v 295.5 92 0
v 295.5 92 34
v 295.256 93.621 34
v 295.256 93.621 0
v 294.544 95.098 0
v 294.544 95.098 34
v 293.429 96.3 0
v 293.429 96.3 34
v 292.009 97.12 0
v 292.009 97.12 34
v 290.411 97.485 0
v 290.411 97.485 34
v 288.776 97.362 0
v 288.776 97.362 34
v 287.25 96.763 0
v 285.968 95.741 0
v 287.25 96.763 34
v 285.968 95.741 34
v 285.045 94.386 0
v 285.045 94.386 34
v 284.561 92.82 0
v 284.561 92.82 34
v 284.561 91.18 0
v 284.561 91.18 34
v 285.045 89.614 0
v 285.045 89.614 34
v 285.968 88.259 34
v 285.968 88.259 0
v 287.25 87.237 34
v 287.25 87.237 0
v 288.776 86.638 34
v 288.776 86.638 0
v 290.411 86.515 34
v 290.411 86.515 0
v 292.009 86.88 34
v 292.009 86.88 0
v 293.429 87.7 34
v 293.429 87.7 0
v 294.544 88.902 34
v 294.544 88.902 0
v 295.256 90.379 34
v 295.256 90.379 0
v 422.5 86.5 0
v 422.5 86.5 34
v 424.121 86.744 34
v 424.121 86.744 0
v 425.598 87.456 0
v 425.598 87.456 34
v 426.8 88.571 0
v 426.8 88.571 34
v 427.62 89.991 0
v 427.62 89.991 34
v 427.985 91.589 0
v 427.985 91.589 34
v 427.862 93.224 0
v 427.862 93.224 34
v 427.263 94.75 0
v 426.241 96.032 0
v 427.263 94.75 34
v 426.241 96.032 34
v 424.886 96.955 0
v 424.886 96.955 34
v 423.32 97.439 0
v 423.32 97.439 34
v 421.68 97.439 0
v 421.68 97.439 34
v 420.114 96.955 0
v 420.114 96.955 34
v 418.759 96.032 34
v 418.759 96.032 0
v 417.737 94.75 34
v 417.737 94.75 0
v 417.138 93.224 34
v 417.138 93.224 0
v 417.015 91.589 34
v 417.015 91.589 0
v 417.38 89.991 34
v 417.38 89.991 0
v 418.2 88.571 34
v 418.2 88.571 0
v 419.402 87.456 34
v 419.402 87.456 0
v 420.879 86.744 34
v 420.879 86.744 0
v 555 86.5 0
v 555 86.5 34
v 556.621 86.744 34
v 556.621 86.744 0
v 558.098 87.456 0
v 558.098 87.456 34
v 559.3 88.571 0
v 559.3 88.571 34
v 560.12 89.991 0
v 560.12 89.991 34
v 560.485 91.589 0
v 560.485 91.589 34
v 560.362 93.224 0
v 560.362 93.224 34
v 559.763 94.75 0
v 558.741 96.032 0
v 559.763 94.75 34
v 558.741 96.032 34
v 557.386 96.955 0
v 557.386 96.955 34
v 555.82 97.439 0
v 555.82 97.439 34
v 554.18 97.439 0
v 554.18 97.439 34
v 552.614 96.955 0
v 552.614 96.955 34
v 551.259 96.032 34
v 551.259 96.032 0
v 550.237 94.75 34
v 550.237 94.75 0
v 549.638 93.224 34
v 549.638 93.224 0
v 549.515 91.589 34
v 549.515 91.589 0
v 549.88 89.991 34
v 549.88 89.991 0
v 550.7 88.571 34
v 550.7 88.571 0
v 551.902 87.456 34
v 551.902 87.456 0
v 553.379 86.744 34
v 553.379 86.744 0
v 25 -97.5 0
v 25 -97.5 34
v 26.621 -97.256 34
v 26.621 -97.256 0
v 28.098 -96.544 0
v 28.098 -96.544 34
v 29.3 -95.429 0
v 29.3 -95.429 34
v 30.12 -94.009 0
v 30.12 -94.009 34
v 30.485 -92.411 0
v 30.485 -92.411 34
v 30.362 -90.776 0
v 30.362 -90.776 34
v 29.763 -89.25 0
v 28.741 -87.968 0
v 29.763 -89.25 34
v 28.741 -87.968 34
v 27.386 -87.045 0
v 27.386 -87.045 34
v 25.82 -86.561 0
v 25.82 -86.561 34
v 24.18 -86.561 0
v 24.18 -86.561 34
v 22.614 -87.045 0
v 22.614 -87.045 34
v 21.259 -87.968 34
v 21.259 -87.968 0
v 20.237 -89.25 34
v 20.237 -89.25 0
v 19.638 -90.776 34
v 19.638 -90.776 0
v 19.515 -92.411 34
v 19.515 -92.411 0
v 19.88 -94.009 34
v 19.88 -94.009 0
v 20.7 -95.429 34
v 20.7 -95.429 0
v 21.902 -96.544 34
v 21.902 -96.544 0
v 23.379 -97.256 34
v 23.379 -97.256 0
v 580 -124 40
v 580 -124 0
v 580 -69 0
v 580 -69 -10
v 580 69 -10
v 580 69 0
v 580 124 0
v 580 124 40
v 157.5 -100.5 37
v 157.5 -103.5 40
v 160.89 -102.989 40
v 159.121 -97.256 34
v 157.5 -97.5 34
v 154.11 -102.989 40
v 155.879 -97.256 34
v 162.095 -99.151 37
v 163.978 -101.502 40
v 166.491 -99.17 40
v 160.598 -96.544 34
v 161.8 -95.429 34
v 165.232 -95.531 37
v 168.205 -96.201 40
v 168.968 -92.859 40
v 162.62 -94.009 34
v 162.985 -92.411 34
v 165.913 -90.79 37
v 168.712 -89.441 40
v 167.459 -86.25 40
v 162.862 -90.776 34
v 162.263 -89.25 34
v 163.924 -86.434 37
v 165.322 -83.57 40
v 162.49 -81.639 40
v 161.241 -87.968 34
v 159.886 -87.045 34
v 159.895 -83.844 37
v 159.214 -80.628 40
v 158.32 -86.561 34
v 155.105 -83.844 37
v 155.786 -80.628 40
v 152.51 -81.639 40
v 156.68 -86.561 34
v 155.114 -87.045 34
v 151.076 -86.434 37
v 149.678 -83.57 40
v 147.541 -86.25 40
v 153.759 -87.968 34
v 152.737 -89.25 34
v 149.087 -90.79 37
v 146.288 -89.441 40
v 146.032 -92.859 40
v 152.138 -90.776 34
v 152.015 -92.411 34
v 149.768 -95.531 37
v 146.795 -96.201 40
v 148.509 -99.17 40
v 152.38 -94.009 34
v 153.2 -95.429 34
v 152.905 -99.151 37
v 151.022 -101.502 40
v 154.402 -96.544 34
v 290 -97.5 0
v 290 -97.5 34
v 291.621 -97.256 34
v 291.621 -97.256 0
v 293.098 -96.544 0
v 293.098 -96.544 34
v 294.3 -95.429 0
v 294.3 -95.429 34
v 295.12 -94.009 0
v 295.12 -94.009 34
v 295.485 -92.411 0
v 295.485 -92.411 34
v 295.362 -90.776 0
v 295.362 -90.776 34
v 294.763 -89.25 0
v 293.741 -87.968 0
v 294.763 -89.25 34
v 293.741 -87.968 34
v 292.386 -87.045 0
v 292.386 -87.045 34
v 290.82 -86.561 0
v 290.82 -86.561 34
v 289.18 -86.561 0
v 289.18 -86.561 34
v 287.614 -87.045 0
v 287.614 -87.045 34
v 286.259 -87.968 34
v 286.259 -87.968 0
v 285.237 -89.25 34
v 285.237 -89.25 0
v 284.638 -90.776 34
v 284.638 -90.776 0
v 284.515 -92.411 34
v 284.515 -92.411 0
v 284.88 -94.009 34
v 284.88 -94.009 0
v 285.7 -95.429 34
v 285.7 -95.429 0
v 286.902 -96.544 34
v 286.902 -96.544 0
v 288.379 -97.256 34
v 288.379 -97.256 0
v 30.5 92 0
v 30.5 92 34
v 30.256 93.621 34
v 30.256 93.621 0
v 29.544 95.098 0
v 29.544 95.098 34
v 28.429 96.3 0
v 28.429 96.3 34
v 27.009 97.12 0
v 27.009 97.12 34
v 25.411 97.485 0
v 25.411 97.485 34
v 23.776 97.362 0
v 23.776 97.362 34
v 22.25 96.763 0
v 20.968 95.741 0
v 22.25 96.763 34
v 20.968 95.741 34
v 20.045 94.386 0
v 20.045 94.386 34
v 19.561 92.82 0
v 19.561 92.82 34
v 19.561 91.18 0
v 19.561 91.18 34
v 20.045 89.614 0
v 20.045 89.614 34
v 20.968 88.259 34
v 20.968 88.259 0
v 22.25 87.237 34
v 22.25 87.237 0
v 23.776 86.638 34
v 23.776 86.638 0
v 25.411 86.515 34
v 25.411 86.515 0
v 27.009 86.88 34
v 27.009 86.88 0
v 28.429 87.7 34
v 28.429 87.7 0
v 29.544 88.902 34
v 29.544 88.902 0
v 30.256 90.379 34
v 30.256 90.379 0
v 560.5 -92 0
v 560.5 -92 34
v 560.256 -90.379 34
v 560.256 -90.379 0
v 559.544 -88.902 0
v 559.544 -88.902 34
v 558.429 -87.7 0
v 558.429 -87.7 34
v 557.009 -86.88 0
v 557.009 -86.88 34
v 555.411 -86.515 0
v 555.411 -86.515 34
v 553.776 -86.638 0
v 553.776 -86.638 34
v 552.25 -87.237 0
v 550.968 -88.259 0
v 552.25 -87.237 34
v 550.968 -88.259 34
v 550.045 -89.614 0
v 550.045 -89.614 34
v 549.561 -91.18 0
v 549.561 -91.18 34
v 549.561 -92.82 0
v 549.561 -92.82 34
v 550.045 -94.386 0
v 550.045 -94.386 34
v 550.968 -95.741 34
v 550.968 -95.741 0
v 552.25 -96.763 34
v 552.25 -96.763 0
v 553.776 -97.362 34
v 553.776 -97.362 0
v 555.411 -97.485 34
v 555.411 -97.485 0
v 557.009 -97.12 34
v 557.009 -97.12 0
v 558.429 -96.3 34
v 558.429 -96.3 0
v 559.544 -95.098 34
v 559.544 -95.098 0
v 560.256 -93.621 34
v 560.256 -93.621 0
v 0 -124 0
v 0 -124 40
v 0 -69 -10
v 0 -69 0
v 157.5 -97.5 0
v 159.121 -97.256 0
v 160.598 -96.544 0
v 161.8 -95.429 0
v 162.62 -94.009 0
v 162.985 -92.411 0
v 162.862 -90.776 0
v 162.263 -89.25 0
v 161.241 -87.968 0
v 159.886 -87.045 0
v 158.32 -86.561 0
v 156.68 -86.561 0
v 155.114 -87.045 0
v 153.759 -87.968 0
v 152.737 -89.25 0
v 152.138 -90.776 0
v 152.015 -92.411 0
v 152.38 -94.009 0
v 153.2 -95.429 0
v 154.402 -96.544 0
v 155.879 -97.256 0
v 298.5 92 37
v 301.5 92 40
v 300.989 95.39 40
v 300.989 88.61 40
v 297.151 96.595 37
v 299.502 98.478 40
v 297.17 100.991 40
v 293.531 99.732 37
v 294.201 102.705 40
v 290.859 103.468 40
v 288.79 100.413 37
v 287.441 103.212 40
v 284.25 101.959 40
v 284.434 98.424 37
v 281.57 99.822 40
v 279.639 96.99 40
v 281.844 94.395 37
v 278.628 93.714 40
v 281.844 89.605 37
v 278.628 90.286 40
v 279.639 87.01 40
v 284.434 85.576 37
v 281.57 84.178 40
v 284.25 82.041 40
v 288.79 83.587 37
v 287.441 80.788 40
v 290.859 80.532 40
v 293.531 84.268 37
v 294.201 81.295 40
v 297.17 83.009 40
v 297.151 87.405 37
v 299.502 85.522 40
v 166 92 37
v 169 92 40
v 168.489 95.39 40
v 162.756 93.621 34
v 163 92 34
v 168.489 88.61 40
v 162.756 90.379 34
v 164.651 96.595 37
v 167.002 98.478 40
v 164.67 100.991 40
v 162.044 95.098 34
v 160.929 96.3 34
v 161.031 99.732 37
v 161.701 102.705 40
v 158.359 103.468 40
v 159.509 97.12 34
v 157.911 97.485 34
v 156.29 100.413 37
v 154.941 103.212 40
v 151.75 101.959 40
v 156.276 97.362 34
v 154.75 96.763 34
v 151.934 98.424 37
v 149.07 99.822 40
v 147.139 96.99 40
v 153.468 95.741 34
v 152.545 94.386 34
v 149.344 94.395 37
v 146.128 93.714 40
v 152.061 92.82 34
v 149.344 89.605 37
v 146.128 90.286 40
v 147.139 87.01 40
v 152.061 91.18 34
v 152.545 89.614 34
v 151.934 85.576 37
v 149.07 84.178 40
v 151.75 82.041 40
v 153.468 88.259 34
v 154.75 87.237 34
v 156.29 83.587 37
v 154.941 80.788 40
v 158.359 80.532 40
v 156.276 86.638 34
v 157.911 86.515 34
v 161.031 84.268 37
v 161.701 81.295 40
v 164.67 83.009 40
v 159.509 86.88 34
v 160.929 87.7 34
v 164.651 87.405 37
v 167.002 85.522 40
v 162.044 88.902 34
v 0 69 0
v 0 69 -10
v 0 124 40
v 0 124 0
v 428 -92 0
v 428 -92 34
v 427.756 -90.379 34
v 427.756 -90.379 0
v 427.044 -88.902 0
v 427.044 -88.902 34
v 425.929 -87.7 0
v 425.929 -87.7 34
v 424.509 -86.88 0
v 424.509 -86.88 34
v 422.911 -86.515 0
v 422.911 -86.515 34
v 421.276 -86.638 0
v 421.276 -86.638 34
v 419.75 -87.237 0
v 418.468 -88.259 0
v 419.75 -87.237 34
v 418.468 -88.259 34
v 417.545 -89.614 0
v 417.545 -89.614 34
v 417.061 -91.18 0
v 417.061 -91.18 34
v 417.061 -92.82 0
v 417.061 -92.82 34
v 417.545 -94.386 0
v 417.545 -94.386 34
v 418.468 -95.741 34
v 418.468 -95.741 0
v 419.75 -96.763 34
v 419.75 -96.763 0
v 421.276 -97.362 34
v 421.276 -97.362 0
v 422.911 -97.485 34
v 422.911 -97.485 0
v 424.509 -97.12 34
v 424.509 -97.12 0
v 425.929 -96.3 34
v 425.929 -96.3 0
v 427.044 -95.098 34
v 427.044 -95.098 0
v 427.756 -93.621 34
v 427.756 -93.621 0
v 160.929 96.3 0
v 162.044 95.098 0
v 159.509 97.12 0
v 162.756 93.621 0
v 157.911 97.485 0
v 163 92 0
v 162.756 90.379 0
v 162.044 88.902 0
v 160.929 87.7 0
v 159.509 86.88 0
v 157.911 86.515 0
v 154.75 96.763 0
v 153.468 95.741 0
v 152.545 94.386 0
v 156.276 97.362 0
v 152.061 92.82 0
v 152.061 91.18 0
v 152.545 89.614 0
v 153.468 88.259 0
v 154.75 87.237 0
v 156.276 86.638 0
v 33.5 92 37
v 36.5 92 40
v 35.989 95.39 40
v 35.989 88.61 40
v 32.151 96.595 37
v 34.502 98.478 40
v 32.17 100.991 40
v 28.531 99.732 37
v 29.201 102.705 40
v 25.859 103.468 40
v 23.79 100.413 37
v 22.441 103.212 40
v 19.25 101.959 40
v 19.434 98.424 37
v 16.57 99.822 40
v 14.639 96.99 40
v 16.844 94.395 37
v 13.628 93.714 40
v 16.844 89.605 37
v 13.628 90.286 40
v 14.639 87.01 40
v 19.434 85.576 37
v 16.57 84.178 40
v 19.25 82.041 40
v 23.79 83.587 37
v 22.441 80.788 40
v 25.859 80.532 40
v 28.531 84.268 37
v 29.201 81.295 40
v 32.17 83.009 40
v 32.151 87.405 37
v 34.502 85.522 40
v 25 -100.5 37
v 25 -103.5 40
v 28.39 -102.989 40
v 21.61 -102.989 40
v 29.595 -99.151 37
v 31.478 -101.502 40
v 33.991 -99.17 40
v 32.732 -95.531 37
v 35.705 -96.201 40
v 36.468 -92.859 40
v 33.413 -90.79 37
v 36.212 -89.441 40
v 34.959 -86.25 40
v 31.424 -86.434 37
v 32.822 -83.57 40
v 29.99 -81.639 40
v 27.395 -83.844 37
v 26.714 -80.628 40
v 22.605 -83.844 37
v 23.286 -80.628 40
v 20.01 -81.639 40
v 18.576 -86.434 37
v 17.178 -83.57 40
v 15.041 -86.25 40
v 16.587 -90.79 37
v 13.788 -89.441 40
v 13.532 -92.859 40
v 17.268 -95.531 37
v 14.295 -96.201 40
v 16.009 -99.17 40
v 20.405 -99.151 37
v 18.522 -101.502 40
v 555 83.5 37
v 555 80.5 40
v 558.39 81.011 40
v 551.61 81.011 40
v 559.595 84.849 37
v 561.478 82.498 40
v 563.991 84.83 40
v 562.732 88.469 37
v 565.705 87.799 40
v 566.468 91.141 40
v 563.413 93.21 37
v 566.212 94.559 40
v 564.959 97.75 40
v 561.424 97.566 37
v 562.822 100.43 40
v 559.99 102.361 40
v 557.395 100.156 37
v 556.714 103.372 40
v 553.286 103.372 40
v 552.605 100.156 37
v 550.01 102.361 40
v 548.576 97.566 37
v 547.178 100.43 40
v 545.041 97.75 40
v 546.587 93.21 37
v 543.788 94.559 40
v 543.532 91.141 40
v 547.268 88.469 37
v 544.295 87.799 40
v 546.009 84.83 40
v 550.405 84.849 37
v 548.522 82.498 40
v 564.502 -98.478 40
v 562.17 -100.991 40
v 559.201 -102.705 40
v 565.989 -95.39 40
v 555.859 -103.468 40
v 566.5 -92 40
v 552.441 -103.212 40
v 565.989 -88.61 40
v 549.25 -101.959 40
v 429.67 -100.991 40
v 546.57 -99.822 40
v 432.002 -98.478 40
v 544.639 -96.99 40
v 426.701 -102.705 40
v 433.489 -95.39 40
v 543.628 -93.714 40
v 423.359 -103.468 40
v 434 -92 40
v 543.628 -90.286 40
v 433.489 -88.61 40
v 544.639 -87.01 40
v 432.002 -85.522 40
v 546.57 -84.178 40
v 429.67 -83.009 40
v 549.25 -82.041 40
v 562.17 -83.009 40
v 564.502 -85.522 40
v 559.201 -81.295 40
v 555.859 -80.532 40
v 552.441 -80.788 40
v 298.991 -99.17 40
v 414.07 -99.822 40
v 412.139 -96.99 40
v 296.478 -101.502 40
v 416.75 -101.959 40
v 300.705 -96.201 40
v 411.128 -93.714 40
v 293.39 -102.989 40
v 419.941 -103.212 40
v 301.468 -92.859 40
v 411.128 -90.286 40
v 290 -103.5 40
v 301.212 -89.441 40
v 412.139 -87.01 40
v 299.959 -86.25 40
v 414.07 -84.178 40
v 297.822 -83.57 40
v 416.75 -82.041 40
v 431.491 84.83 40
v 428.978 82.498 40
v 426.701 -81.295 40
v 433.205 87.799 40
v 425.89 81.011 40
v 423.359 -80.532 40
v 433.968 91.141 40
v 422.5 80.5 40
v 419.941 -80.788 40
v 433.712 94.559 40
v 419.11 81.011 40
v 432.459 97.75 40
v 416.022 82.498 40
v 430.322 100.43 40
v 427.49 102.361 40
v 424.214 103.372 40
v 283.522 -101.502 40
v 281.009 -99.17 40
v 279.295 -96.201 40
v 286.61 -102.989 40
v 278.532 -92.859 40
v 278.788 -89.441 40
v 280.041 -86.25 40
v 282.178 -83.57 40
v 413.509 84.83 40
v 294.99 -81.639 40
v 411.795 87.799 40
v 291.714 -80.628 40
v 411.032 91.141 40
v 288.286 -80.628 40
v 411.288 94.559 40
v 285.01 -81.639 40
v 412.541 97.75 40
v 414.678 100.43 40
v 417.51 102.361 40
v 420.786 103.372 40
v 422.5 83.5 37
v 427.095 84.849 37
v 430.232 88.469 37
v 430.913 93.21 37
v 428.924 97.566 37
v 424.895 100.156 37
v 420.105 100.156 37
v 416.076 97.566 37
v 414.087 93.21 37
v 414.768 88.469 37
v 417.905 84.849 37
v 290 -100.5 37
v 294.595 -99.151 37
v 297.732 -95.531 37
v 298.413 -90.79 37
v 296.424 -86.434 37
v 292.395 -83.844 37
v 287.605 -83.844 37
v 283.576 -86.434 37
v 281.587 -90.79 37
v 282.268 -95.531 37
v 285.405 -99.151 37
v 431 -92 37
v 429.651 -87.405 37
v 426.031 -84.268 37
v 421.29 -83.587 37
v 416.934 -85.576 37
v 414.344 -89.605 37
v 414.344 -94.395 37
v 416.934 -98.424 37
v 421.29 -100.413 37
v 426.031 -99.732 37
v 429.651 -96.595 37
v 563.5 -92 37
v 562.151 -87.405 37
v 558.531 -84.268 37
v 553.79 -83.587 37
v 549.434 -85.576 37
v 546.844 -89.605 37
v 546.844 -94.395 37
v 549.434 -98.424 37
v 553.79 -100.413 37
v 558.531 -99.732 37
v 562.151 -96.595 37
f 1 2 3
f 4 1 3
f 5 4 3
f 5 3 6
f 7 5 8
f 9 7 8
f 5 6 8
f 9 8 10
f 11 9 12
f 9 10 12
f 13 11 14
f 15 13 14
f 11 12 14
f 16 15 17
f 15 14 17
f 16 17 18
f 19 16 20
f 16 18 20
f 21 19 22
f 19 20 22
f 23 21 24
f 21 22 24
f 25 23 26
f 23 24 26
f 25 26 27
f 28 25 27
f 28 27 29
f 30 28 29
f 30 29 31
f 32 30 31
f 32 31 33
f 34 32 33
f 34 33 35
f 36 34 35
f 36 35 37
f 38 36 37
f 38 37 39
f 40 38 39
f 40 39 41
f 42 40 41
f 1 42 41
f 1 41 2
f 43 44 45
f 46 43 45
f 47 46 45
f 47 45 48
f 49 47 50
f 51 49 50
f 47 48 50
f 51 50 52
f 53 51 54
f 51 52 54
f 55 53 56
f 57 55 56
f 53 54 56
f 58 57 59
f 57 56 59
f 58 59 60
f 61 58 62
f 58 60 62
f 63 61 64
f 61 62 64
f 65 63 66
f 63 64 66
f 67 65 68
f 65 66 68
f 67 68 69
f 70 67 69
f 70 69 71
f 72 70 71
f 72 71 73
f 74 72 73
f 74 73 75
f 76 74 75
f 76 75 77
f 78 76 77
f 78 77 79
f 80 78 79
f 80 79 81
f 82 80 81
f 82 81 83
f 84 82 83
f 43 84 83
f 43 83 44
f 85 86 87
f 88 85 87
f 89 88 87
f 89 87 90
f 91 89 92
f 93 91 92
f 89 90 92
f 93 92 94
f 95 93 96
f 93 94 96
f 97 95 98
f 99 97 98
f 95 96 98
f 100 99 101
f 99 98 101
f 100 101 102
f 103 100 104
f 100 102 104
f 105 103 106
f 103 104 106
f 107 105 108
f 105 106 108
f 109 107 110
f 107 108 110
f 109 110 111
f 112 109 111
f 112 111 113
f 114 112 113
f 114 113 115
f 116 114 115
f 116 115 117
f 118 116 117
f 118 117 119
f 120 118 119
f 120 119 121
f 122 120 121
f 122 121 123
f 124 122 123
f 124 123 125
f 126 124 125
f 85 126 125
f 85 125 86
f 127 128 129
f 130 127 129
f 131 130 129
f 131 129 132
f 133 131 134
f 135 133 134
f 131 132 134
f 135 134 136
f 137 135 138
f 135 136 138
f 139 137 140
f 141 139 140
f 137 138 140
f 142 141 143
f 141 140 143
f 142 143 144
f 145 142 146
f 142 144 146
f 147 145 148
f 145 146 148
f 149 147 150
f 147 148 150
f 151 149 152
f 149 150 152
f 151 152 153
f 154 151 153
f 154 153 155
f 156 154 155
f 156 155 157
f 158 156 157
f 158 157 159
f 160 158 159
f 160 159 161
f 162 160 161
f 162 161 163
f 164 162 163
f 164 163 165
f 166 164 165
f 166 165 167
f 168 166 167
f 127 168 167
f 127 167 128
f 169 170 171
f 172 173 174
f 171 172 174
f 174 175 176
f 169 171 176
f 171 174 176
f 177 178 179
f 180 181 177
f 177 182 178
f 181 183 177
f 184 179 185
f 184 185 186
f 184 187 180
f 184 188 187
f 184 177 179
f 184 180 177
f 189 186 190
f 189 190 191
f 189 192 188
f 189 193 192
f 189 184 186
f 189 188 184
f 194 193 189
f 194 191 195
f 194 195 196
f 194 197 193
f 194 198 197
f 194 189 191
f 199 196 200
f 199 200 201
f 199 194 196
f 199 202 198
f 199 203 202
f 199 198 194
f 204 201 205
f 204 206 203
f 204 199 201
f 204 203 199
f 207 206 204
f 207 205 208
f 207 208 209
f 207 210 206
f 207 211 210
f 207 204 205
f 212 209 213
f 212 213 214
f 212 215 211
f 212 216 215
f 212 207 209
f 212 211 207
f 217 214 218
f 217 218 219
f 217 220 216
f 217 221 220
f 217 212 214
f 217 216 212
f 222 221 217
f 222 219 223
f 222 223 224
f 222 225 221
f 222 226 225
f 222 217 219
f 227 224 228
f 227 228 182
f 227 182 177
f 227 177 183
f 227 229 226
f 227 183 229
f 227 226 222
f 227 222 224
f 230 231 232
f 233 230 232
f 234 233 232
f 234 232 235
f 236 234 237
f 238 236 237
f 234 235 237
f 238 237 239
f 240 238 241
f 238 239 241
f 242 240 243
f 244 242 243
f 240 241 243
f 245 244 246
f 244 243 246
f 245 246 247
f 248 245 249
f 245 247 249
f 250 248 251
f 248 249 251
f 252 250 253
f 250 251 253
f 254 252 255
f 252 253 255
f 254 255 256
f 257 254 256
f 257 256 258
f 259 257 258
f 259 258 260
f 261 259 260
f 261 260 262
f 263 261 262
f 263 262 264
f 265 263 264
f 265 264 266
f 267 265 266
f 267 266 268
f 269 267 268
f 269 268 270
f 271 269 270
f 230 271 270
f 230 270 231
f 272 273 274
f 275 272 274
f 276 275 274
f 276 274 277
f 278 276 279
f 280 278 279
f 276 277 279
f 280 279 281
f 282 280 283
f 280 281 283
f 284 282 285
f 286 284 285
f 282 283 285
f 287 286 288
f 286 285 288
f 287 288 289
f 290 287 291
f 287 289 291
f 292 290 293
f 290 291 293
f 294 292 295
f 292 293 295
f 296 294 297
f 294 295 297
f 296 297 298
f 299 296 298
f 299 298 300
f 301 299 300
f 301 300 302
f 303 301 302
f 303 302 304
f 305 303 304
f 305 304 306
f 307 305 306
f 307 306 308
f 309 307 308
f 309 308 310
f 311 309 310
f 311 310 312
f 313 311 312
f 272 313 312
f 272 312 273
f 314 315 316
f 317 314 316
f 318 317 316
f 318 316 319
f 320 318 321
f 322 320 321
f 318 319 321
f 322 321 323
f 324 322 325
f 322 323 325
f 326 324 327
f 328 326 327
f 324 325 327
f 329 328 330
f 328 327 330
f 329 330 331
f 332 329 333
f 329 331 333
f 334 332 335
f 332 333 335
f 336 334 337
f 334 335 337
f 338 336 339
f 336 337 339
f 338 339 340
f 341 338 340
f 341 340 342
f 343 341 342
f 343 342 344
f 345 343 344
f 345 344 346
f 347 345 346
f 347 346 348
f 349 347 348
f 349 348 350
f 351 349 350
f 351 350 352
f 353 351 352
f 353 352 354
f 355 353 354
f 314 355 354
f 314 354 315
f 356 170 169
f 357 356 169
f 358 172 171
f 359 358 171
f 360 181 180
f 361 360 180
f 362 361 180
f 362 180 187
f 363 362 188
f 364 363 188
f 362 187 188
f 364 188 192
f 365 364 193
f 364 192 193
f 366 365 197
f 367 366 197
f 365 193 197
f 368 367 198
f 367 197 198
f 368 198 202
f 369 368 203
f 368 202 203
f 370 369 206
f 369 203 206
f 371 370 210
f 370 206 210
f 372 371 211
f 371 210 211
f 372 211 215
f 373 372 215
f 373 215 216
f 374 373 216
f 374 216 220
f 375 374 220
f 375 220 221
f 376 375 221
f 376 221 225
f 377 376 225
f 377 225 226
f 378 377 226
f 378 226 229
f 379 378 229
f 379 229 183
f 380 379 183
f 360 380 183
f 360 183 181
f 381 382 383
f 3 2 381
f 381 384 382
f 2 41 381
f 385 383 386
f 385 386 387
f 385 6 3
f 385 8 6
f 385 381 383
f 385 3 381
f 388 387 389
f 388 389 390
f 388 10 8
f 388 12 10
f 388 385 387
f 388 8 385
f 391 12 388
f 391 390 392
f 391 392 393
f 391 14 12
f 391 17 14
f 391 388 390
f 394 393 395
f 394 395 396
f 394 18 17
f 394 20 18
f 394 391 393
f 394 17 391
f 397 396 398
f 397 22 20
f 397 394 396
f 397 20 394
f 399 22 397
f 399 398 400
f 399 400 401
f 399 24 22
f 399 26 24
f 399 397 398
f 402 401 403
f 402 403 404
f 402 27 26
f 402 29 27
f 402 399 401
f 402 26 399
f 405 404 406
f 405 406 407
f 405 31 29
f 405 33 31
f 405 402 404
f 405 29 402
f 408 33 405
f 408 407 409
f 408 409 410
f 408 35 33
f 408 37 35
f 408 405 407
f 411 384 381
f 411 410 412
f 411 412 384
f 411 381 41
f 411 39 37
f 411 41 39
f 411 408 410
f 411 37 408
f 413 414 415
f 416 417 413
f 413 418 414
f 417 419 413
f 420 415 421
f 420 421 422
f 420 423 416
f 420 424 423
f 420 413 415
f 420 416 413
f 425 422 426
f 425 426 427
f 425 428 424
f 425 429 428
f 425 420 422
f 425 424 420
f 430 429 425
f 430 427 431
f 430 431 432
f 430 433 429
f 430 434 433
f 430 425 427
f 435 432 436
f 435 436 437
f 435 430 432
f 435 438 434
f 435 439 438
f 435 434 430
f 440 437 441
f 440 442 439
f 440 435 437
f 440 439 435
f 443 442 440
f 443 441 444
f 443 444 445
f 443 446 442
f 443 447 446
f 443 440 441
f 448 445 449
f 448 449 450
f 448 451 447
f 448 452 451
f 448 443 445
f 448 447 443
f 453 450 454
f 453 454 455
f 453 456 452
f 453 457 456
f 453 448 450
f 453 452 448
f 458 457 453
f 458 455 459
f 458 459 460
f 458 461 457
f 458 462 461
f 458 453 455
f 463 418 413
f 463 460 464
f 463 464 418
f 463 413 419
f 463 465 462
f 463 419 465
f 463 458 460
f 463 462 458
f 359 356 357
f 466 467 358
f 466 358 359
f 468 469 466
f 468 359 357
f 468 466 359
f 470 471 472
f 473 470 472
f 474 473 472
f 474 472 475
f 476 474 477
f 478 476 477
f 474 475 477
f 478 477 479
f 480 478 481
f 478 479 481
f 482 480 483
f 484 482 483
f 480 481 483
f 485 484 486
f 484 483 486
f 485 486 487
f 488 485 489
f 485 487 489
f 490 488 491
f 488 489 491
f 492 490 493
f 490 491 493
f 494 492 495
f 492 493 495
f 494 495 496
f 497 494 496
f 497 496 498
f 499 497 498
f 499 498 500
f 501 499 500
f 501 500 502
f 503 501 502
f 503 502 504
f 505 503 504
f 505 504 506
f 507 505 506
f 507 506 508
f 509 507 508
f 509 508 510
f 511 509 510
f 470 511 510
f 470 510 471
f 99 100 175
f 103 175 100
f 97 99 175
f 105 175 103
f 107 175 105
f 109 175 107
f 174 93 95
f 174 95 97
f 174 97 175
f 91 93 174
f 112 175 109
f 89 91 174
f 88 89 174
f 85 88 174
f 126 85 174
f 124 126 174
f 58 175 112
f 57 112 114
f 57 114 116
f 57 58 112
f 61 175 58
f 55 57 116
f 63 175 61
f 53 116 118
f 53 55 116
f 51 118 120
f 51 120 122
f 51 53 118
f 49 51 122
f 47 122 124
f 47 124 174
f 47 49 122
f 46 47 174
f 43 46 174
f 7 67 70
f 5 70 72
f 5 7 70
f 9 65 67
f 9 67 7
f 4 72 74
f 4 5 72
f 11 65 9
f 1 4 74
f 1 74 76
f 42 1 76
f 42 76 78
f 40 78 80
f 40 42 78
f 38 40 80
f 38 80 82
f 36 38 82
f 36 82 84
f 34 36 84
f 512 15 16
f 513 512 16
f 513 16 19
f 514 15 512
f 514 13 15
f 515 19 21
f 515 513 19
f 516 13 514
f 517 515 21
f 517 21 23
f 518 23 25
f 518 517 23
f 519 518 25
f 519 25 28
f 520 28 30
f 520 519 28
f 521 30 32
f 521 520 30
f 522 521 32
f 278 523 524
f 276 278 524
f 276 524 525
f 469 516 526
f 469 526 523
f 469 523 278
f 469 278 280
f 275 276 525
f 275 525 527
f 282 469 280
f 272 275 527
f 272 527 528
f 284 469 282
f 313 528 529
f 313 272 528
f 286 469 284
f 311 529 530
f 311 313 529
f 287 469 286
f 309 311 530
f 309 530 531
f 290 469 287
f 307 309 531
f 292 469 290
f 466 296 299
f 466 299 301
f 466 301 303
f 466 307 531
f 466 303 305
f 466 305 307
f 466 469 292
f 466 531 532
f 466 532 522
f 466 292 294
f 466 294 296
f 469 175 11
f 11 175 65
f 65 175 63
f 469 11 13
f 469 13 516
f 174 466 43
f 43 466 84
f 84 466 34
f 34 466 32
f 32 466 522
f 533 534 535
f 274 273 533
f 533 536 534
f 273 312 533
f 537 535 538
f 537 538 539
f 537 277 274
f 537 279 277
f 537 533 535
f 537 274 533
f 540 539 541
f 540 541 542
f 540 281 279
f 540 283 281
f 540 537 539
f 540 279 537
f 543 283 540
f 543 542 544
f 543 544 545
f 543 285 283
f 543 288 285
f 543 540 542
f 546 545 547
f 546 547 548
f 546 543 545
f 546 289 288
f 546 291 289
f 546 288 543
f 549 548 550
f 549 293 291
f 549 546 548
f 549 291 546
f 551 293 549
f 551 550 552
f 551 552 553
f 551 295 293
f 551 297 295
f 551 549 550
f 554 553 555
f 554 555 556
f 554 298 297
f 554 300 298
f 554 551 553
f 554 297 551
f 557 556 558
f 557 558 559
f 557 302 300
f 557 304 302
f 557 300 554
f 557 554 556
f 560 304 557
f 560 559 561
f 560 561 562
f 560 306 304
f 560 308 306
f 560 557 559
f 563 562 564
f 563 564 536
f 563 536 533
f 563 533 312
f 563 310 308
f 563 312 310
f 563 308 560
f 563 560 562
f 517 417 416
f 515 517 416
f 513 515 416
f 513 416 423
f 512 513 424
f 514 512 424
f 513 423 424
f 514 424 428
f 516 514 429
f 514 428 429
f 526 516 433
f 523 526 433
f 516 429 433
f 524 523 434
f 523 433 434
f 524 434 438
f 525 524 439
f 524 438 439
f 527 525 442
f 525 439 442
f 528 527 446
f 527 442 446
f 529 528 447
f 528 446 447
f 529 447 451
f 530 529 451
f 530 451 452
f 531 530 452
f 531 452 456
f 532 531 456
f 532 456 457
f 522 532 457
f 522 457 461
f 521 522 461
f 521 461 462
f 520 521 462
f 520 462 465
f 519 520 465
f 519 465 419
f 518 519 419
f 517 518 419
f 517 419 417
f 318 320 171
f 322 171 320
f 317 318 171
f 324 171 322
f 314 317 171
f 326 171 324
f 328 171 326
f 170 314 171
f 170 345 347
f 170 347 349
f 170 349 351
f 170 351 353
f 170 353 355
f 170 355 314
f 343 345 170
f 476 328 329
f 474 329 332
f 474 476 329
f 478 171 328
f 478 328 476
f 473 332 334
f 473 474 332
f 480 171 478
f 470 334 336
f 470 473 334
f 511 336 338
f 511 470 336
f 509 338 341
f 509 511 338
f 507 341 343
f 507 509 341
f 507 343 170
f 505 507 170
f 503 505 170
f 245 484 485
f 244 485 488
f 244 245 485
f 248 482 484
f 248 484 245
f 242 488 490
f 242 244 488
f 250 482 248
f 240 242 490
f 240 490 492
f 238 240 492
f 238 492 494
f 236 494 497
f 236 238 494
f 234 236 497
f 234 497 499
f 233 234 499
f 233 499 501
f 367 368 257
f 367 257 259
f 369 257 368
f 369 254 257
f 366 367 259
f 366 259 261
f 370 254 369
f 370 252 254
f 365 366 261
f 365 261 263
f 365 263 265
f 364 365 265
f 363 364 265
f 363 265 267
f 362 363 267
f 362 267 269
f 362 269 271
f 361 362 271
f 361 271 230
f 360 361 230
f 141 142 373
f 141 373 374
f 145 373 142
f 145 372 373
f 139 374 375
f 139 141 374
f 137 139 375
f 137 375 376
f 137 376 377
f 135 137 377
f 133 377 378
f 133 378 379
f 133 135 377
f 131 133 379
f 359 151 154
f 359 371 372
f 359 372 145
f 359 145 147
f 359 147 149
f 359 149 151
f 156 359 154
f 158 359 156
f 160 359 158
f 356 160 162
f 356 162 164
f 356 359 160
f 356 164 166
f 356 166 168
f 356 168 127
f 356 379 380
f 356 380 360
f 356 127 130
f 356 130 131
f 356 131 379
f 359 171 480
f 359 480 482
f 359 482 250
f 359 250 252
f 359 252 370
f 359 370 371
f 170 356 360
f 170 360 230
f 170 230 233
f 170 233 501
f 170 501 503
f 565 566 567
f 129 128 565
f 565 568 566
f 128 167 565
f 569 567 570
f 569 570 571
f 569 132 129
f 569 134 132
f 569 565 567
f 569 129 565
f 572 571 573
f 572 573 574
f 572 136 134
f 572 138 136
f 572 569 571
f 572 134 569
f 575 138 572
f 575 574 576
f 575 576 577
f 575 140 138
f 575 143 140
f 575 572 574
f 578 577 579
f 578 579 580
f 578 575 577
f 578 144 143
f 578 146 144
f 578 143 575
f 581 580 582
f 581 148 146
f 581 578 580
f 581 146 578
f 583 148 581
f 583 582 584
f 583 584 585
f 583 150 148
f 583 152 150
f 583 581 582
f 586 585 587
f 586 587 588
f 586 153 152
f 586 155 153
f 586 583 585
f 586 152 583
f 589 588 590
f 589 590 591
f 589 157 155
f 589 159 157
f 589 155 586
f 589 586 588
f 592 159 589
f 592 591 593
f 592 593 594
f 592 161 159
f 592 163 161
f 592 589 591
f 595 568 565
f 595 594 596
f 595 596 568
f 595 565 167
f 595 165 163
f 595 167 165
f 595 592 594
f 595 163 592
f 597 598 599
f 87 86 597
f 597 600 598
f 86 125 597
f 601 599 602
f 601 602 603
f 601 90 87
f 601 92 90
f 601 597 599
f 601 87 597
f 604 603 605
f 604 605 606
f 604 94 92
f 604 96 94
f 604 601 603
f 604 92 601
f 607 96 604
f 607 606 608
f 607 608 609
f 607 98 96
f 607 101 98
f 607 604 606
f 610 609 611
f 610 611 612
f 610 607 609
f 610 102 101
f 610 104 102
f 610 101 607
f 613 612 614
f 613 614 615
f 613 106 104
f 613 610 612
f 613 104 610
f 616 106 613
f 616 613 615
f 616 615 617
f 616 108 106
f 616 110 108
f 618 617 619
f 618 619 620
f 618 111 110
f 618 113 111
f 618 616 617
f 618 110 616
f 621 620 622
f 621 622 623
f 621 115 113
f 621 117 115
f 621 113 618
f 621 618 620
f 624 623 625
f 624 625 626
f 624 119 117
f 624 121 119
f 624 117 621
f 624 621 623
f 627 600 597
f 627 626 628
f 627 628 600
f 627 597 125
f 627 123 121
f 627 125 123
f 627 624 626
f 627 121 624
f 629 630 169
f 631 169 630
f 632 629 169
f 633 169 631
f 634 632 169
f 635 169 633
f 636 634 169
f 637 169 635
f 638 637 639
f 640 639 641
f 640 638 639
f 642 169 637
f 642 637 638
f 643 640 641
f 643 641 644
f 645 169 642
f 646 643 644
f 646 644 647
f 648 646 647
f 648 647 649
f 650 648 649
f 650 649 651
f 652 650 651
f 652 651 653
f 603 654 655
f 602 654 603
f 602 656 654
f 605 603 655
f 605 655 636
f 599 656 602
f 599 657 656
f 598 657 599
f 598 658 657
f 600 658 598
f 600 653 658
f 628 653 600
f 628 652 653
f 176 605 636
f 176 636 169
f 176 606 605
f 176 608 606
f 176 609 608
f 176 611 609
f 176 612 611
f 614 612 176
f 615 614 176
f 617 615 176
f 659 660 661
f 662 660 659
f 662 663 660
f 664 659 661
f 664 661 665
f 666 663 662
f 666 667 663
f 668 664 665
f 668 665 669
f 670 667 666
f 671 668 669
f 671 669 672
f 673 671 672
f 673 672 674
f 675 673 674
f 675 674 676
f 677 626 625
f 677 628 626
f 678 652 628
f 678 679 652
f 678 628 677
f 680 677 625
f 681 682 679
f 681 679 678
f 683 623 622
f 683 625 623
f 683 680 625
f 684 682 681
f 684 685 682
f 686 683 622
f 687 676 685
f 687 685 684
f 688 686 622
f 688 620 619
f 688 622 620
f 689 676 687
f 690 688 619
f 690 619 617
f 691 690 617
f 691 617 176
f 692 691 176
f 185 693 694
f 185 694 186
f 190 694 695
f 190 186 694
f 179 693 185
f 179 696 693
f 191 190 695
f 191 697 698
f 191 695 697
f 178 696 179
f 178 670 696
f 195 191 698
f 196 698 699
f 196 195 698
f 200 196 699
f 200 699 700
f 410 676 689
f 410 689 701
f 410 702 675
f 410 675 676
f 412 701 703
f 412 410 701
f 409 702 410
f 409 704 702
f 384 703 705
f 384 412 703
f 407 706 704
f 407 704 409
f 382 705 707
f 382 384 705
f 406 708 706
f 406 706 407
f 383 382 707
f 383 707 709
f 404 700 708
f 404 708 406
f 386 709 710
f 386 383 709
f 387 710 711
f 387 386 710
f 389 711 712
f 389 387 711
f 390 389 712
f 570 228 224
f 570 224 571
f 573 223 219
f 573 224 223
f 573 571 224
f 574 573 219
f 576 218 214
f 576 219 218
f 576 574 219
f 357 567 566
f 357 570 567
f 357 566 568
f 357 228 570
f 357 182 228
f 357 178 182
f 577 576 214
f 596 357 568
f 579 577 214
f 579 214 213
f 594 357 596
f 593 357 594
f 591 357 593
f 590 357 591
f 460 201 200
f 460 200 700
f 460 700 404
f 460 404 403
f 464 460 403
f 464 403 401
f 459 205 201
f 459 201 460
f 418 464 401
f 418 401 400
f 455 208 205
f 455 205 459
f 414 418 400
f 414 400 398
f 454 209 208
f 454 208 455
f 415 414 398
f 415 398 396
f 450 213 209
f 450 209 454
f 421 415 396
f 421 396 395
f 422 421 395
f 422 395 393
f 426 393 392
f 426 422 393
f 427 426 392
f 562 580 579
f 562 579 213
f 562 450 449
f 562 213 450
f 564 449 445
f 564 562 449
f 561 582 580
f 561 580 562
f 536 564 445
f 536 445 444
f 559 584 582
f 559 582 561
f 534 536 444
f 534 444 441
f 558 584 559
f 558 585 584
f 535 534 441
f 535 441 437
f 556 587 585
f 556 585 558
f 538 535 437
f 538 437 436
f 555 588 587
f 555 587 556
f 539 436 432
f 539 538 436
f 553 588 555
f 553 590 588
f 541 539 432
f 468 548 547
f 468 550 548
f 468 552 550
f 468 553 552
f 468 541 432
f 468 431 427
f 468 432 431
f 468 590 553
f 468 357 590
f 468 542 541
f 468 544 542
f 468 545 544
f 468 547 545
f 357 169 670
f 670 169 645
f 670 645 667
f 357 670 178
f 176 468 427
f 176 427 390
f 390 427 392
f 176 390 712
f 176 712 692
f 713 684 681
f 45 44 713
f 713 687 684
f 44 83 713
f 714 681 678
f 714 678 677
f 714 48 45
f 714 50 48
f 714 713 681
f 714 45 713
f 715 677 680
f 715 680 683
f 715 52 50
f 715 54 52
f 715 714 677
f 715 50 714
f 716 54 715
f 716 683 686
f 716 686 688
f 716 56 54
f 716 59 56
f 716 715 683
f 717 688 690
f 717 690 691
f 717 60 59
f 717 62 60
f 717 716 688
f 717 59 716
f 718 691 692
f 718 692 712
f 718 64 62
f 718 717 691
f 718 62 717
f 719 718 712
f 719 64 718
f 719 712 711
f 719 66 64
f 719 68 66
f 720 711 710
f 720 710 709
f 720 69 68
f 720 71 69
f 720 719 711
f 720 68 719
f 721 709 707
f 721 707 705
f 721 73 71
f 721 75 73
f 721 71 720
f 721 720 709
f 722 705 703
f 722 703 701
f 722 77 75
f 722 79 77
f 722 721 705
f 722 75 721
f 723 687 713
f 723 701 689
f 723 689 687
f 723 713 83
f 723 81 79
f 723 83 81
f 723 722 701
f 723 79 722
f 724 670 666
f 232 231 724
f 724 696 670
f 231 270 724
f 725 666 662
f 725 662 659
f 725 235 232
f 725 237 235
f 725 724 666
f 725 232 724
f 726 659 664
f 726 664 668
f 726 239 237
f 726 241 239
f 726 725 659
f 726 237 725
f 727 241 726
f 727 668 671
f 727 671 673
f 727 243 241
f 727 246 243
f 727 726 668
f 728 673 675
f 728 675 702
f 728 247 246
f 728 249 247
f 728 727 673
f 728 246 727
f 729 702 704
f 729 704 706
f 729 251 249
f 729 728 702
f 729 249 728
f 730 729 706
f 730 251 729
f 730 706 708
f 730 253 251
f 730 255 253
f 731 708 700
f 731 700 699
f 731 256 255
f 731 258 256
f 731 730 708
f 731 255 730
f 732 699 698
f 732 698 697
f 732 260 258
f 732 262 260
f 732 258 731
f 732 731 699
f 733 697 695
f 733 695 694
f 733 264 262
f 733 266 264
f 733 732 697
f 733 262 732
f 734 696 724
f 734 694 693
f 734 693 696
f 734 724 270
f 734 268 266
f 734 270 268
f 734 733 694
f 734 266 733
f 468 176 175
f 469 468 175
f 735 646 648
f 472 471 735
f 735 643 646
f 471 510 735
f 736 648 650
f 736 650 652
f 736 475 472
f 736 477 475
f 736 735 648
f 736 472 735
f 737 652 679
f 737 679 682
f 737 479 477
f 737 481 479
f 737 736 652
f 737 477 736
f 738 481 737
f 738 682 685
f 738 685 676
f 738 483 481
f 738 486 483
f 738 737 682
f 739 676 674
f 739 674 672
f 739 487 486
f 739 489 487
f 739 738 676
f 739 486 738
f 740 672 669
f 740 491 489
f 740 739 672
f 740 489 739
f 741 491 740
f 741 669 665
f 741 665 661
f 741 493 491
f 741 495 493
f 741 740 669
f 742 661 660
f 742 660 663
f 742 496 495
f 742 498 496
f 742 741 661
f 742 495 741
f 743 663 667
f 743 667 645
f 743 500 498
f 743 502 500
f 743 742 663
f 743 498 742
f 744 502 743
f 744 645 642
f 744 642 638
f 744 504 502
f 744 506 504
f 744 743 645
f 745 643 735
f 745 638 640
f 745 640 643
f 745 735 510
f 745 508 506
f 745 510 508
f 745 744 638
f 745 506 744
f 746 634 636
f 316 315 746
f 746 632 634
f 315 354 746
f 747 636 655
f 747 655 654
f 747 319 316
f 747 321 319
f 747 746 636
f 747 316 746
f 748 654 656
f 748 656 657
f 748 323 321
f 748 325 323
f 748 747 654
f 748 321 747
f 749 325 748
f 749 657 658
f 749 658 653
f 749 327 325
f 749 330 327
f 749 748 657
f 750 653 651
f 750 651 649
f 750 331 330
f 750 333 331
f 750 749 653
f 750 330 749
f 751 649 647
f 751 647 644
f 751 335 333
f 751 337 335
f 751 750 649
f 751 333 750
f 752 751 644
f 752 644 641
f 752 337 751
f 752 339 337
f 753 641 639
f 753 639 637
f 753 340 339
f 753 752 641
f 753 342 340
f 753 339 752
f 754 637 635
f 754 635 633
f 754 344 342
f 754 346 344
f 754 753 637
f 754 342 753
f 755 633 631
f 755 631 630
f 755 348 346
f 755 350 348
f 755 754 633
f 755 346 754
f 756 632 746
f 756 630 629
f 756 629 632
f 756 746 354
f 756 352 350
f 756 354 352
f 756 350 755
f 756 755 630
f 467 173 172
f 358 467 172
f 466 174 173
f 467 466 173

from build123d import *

# Parameters (mm, degrees)
BOSS_EXTRUDE1_DEPTH = 580
SKETCH2_R           = 5.5
CUT_EXTRUDE1_DEPTH  = 596.210886997
CHAMFER1_SIZE       = 6


with BuildPart() as part:
    # Sketch1 → Boss-Extrude1 (new body)
    with BuildSketch(Plane(origin=(0, 0, 0), x_dir=(0, 0, -1), z_dir=(1, 0, 0))):
        Polygon((0, -124), (-40, -124), (-40, 124), (0, 124), (0, 69), (10, 69), (10, -69), (0, -69), align=None)
    extrude(amount=BOSS_EXTRUDE1_DEPTH)

    # Sketch2 → Cut-Extrude1 (cut, through all)
    with BuildSketch(Plane.XY.offset(40)):
        with Locations((25, 92)):
            Circle(SKETCH2_R)
        with Locations((157.5, 92)):
            Circle(SKETCH2_R)
        with Locations(Location((422.5, 92, 0), (0, 0, 270))):
            Circle(SKETCH2_R)
        with Locations(Location((555, 92, 0), (0, 0, 270))):
            Circle(SKETCH2_R)
        with Locations((290, 92)):
            Circle(SKETCH2_R)
        with Locations((555, -92)):
            Circle(SKETCH2_R)
        with Locations((422.5, -92)):
            Circle(SKETCH2_R)
        with Locations(Location((290, -92, 0), (0, 0, 270))):
            Circle(SKETCH2_R)
        with Locations(Location((157.5, -92, 0), (0, 0, 270))):
            Circle(SKETCH2_R)
        with Locations(Location((25, -92, 0), (0, 0, 270))):
            Circle(SKETCH2_R)
    extrude(amount=-CUT_EXTRUDE1_DEPTH, mode=Mode.SUBTRACT)

    # Chamfer1
    chamfer1_edges = [part.edges().sort_by_distance(p)[0] for p in [
        (25, -86.5, 40),
        (157.5, -86.5, 40),
        (290, -86.5, 40),
        (417, -92, 40),
        (549.5, -92, 40),
        (152, 92, 40),
        (422.5, 97.5, 40),
        (555, 97.5, 40),
        (284.5, 92, 40),
        (19.5, 92, 40),
    ]]
    chamfer(chamfer1_edges, length=CHAMFER1_SIZE)


solid = part.part
